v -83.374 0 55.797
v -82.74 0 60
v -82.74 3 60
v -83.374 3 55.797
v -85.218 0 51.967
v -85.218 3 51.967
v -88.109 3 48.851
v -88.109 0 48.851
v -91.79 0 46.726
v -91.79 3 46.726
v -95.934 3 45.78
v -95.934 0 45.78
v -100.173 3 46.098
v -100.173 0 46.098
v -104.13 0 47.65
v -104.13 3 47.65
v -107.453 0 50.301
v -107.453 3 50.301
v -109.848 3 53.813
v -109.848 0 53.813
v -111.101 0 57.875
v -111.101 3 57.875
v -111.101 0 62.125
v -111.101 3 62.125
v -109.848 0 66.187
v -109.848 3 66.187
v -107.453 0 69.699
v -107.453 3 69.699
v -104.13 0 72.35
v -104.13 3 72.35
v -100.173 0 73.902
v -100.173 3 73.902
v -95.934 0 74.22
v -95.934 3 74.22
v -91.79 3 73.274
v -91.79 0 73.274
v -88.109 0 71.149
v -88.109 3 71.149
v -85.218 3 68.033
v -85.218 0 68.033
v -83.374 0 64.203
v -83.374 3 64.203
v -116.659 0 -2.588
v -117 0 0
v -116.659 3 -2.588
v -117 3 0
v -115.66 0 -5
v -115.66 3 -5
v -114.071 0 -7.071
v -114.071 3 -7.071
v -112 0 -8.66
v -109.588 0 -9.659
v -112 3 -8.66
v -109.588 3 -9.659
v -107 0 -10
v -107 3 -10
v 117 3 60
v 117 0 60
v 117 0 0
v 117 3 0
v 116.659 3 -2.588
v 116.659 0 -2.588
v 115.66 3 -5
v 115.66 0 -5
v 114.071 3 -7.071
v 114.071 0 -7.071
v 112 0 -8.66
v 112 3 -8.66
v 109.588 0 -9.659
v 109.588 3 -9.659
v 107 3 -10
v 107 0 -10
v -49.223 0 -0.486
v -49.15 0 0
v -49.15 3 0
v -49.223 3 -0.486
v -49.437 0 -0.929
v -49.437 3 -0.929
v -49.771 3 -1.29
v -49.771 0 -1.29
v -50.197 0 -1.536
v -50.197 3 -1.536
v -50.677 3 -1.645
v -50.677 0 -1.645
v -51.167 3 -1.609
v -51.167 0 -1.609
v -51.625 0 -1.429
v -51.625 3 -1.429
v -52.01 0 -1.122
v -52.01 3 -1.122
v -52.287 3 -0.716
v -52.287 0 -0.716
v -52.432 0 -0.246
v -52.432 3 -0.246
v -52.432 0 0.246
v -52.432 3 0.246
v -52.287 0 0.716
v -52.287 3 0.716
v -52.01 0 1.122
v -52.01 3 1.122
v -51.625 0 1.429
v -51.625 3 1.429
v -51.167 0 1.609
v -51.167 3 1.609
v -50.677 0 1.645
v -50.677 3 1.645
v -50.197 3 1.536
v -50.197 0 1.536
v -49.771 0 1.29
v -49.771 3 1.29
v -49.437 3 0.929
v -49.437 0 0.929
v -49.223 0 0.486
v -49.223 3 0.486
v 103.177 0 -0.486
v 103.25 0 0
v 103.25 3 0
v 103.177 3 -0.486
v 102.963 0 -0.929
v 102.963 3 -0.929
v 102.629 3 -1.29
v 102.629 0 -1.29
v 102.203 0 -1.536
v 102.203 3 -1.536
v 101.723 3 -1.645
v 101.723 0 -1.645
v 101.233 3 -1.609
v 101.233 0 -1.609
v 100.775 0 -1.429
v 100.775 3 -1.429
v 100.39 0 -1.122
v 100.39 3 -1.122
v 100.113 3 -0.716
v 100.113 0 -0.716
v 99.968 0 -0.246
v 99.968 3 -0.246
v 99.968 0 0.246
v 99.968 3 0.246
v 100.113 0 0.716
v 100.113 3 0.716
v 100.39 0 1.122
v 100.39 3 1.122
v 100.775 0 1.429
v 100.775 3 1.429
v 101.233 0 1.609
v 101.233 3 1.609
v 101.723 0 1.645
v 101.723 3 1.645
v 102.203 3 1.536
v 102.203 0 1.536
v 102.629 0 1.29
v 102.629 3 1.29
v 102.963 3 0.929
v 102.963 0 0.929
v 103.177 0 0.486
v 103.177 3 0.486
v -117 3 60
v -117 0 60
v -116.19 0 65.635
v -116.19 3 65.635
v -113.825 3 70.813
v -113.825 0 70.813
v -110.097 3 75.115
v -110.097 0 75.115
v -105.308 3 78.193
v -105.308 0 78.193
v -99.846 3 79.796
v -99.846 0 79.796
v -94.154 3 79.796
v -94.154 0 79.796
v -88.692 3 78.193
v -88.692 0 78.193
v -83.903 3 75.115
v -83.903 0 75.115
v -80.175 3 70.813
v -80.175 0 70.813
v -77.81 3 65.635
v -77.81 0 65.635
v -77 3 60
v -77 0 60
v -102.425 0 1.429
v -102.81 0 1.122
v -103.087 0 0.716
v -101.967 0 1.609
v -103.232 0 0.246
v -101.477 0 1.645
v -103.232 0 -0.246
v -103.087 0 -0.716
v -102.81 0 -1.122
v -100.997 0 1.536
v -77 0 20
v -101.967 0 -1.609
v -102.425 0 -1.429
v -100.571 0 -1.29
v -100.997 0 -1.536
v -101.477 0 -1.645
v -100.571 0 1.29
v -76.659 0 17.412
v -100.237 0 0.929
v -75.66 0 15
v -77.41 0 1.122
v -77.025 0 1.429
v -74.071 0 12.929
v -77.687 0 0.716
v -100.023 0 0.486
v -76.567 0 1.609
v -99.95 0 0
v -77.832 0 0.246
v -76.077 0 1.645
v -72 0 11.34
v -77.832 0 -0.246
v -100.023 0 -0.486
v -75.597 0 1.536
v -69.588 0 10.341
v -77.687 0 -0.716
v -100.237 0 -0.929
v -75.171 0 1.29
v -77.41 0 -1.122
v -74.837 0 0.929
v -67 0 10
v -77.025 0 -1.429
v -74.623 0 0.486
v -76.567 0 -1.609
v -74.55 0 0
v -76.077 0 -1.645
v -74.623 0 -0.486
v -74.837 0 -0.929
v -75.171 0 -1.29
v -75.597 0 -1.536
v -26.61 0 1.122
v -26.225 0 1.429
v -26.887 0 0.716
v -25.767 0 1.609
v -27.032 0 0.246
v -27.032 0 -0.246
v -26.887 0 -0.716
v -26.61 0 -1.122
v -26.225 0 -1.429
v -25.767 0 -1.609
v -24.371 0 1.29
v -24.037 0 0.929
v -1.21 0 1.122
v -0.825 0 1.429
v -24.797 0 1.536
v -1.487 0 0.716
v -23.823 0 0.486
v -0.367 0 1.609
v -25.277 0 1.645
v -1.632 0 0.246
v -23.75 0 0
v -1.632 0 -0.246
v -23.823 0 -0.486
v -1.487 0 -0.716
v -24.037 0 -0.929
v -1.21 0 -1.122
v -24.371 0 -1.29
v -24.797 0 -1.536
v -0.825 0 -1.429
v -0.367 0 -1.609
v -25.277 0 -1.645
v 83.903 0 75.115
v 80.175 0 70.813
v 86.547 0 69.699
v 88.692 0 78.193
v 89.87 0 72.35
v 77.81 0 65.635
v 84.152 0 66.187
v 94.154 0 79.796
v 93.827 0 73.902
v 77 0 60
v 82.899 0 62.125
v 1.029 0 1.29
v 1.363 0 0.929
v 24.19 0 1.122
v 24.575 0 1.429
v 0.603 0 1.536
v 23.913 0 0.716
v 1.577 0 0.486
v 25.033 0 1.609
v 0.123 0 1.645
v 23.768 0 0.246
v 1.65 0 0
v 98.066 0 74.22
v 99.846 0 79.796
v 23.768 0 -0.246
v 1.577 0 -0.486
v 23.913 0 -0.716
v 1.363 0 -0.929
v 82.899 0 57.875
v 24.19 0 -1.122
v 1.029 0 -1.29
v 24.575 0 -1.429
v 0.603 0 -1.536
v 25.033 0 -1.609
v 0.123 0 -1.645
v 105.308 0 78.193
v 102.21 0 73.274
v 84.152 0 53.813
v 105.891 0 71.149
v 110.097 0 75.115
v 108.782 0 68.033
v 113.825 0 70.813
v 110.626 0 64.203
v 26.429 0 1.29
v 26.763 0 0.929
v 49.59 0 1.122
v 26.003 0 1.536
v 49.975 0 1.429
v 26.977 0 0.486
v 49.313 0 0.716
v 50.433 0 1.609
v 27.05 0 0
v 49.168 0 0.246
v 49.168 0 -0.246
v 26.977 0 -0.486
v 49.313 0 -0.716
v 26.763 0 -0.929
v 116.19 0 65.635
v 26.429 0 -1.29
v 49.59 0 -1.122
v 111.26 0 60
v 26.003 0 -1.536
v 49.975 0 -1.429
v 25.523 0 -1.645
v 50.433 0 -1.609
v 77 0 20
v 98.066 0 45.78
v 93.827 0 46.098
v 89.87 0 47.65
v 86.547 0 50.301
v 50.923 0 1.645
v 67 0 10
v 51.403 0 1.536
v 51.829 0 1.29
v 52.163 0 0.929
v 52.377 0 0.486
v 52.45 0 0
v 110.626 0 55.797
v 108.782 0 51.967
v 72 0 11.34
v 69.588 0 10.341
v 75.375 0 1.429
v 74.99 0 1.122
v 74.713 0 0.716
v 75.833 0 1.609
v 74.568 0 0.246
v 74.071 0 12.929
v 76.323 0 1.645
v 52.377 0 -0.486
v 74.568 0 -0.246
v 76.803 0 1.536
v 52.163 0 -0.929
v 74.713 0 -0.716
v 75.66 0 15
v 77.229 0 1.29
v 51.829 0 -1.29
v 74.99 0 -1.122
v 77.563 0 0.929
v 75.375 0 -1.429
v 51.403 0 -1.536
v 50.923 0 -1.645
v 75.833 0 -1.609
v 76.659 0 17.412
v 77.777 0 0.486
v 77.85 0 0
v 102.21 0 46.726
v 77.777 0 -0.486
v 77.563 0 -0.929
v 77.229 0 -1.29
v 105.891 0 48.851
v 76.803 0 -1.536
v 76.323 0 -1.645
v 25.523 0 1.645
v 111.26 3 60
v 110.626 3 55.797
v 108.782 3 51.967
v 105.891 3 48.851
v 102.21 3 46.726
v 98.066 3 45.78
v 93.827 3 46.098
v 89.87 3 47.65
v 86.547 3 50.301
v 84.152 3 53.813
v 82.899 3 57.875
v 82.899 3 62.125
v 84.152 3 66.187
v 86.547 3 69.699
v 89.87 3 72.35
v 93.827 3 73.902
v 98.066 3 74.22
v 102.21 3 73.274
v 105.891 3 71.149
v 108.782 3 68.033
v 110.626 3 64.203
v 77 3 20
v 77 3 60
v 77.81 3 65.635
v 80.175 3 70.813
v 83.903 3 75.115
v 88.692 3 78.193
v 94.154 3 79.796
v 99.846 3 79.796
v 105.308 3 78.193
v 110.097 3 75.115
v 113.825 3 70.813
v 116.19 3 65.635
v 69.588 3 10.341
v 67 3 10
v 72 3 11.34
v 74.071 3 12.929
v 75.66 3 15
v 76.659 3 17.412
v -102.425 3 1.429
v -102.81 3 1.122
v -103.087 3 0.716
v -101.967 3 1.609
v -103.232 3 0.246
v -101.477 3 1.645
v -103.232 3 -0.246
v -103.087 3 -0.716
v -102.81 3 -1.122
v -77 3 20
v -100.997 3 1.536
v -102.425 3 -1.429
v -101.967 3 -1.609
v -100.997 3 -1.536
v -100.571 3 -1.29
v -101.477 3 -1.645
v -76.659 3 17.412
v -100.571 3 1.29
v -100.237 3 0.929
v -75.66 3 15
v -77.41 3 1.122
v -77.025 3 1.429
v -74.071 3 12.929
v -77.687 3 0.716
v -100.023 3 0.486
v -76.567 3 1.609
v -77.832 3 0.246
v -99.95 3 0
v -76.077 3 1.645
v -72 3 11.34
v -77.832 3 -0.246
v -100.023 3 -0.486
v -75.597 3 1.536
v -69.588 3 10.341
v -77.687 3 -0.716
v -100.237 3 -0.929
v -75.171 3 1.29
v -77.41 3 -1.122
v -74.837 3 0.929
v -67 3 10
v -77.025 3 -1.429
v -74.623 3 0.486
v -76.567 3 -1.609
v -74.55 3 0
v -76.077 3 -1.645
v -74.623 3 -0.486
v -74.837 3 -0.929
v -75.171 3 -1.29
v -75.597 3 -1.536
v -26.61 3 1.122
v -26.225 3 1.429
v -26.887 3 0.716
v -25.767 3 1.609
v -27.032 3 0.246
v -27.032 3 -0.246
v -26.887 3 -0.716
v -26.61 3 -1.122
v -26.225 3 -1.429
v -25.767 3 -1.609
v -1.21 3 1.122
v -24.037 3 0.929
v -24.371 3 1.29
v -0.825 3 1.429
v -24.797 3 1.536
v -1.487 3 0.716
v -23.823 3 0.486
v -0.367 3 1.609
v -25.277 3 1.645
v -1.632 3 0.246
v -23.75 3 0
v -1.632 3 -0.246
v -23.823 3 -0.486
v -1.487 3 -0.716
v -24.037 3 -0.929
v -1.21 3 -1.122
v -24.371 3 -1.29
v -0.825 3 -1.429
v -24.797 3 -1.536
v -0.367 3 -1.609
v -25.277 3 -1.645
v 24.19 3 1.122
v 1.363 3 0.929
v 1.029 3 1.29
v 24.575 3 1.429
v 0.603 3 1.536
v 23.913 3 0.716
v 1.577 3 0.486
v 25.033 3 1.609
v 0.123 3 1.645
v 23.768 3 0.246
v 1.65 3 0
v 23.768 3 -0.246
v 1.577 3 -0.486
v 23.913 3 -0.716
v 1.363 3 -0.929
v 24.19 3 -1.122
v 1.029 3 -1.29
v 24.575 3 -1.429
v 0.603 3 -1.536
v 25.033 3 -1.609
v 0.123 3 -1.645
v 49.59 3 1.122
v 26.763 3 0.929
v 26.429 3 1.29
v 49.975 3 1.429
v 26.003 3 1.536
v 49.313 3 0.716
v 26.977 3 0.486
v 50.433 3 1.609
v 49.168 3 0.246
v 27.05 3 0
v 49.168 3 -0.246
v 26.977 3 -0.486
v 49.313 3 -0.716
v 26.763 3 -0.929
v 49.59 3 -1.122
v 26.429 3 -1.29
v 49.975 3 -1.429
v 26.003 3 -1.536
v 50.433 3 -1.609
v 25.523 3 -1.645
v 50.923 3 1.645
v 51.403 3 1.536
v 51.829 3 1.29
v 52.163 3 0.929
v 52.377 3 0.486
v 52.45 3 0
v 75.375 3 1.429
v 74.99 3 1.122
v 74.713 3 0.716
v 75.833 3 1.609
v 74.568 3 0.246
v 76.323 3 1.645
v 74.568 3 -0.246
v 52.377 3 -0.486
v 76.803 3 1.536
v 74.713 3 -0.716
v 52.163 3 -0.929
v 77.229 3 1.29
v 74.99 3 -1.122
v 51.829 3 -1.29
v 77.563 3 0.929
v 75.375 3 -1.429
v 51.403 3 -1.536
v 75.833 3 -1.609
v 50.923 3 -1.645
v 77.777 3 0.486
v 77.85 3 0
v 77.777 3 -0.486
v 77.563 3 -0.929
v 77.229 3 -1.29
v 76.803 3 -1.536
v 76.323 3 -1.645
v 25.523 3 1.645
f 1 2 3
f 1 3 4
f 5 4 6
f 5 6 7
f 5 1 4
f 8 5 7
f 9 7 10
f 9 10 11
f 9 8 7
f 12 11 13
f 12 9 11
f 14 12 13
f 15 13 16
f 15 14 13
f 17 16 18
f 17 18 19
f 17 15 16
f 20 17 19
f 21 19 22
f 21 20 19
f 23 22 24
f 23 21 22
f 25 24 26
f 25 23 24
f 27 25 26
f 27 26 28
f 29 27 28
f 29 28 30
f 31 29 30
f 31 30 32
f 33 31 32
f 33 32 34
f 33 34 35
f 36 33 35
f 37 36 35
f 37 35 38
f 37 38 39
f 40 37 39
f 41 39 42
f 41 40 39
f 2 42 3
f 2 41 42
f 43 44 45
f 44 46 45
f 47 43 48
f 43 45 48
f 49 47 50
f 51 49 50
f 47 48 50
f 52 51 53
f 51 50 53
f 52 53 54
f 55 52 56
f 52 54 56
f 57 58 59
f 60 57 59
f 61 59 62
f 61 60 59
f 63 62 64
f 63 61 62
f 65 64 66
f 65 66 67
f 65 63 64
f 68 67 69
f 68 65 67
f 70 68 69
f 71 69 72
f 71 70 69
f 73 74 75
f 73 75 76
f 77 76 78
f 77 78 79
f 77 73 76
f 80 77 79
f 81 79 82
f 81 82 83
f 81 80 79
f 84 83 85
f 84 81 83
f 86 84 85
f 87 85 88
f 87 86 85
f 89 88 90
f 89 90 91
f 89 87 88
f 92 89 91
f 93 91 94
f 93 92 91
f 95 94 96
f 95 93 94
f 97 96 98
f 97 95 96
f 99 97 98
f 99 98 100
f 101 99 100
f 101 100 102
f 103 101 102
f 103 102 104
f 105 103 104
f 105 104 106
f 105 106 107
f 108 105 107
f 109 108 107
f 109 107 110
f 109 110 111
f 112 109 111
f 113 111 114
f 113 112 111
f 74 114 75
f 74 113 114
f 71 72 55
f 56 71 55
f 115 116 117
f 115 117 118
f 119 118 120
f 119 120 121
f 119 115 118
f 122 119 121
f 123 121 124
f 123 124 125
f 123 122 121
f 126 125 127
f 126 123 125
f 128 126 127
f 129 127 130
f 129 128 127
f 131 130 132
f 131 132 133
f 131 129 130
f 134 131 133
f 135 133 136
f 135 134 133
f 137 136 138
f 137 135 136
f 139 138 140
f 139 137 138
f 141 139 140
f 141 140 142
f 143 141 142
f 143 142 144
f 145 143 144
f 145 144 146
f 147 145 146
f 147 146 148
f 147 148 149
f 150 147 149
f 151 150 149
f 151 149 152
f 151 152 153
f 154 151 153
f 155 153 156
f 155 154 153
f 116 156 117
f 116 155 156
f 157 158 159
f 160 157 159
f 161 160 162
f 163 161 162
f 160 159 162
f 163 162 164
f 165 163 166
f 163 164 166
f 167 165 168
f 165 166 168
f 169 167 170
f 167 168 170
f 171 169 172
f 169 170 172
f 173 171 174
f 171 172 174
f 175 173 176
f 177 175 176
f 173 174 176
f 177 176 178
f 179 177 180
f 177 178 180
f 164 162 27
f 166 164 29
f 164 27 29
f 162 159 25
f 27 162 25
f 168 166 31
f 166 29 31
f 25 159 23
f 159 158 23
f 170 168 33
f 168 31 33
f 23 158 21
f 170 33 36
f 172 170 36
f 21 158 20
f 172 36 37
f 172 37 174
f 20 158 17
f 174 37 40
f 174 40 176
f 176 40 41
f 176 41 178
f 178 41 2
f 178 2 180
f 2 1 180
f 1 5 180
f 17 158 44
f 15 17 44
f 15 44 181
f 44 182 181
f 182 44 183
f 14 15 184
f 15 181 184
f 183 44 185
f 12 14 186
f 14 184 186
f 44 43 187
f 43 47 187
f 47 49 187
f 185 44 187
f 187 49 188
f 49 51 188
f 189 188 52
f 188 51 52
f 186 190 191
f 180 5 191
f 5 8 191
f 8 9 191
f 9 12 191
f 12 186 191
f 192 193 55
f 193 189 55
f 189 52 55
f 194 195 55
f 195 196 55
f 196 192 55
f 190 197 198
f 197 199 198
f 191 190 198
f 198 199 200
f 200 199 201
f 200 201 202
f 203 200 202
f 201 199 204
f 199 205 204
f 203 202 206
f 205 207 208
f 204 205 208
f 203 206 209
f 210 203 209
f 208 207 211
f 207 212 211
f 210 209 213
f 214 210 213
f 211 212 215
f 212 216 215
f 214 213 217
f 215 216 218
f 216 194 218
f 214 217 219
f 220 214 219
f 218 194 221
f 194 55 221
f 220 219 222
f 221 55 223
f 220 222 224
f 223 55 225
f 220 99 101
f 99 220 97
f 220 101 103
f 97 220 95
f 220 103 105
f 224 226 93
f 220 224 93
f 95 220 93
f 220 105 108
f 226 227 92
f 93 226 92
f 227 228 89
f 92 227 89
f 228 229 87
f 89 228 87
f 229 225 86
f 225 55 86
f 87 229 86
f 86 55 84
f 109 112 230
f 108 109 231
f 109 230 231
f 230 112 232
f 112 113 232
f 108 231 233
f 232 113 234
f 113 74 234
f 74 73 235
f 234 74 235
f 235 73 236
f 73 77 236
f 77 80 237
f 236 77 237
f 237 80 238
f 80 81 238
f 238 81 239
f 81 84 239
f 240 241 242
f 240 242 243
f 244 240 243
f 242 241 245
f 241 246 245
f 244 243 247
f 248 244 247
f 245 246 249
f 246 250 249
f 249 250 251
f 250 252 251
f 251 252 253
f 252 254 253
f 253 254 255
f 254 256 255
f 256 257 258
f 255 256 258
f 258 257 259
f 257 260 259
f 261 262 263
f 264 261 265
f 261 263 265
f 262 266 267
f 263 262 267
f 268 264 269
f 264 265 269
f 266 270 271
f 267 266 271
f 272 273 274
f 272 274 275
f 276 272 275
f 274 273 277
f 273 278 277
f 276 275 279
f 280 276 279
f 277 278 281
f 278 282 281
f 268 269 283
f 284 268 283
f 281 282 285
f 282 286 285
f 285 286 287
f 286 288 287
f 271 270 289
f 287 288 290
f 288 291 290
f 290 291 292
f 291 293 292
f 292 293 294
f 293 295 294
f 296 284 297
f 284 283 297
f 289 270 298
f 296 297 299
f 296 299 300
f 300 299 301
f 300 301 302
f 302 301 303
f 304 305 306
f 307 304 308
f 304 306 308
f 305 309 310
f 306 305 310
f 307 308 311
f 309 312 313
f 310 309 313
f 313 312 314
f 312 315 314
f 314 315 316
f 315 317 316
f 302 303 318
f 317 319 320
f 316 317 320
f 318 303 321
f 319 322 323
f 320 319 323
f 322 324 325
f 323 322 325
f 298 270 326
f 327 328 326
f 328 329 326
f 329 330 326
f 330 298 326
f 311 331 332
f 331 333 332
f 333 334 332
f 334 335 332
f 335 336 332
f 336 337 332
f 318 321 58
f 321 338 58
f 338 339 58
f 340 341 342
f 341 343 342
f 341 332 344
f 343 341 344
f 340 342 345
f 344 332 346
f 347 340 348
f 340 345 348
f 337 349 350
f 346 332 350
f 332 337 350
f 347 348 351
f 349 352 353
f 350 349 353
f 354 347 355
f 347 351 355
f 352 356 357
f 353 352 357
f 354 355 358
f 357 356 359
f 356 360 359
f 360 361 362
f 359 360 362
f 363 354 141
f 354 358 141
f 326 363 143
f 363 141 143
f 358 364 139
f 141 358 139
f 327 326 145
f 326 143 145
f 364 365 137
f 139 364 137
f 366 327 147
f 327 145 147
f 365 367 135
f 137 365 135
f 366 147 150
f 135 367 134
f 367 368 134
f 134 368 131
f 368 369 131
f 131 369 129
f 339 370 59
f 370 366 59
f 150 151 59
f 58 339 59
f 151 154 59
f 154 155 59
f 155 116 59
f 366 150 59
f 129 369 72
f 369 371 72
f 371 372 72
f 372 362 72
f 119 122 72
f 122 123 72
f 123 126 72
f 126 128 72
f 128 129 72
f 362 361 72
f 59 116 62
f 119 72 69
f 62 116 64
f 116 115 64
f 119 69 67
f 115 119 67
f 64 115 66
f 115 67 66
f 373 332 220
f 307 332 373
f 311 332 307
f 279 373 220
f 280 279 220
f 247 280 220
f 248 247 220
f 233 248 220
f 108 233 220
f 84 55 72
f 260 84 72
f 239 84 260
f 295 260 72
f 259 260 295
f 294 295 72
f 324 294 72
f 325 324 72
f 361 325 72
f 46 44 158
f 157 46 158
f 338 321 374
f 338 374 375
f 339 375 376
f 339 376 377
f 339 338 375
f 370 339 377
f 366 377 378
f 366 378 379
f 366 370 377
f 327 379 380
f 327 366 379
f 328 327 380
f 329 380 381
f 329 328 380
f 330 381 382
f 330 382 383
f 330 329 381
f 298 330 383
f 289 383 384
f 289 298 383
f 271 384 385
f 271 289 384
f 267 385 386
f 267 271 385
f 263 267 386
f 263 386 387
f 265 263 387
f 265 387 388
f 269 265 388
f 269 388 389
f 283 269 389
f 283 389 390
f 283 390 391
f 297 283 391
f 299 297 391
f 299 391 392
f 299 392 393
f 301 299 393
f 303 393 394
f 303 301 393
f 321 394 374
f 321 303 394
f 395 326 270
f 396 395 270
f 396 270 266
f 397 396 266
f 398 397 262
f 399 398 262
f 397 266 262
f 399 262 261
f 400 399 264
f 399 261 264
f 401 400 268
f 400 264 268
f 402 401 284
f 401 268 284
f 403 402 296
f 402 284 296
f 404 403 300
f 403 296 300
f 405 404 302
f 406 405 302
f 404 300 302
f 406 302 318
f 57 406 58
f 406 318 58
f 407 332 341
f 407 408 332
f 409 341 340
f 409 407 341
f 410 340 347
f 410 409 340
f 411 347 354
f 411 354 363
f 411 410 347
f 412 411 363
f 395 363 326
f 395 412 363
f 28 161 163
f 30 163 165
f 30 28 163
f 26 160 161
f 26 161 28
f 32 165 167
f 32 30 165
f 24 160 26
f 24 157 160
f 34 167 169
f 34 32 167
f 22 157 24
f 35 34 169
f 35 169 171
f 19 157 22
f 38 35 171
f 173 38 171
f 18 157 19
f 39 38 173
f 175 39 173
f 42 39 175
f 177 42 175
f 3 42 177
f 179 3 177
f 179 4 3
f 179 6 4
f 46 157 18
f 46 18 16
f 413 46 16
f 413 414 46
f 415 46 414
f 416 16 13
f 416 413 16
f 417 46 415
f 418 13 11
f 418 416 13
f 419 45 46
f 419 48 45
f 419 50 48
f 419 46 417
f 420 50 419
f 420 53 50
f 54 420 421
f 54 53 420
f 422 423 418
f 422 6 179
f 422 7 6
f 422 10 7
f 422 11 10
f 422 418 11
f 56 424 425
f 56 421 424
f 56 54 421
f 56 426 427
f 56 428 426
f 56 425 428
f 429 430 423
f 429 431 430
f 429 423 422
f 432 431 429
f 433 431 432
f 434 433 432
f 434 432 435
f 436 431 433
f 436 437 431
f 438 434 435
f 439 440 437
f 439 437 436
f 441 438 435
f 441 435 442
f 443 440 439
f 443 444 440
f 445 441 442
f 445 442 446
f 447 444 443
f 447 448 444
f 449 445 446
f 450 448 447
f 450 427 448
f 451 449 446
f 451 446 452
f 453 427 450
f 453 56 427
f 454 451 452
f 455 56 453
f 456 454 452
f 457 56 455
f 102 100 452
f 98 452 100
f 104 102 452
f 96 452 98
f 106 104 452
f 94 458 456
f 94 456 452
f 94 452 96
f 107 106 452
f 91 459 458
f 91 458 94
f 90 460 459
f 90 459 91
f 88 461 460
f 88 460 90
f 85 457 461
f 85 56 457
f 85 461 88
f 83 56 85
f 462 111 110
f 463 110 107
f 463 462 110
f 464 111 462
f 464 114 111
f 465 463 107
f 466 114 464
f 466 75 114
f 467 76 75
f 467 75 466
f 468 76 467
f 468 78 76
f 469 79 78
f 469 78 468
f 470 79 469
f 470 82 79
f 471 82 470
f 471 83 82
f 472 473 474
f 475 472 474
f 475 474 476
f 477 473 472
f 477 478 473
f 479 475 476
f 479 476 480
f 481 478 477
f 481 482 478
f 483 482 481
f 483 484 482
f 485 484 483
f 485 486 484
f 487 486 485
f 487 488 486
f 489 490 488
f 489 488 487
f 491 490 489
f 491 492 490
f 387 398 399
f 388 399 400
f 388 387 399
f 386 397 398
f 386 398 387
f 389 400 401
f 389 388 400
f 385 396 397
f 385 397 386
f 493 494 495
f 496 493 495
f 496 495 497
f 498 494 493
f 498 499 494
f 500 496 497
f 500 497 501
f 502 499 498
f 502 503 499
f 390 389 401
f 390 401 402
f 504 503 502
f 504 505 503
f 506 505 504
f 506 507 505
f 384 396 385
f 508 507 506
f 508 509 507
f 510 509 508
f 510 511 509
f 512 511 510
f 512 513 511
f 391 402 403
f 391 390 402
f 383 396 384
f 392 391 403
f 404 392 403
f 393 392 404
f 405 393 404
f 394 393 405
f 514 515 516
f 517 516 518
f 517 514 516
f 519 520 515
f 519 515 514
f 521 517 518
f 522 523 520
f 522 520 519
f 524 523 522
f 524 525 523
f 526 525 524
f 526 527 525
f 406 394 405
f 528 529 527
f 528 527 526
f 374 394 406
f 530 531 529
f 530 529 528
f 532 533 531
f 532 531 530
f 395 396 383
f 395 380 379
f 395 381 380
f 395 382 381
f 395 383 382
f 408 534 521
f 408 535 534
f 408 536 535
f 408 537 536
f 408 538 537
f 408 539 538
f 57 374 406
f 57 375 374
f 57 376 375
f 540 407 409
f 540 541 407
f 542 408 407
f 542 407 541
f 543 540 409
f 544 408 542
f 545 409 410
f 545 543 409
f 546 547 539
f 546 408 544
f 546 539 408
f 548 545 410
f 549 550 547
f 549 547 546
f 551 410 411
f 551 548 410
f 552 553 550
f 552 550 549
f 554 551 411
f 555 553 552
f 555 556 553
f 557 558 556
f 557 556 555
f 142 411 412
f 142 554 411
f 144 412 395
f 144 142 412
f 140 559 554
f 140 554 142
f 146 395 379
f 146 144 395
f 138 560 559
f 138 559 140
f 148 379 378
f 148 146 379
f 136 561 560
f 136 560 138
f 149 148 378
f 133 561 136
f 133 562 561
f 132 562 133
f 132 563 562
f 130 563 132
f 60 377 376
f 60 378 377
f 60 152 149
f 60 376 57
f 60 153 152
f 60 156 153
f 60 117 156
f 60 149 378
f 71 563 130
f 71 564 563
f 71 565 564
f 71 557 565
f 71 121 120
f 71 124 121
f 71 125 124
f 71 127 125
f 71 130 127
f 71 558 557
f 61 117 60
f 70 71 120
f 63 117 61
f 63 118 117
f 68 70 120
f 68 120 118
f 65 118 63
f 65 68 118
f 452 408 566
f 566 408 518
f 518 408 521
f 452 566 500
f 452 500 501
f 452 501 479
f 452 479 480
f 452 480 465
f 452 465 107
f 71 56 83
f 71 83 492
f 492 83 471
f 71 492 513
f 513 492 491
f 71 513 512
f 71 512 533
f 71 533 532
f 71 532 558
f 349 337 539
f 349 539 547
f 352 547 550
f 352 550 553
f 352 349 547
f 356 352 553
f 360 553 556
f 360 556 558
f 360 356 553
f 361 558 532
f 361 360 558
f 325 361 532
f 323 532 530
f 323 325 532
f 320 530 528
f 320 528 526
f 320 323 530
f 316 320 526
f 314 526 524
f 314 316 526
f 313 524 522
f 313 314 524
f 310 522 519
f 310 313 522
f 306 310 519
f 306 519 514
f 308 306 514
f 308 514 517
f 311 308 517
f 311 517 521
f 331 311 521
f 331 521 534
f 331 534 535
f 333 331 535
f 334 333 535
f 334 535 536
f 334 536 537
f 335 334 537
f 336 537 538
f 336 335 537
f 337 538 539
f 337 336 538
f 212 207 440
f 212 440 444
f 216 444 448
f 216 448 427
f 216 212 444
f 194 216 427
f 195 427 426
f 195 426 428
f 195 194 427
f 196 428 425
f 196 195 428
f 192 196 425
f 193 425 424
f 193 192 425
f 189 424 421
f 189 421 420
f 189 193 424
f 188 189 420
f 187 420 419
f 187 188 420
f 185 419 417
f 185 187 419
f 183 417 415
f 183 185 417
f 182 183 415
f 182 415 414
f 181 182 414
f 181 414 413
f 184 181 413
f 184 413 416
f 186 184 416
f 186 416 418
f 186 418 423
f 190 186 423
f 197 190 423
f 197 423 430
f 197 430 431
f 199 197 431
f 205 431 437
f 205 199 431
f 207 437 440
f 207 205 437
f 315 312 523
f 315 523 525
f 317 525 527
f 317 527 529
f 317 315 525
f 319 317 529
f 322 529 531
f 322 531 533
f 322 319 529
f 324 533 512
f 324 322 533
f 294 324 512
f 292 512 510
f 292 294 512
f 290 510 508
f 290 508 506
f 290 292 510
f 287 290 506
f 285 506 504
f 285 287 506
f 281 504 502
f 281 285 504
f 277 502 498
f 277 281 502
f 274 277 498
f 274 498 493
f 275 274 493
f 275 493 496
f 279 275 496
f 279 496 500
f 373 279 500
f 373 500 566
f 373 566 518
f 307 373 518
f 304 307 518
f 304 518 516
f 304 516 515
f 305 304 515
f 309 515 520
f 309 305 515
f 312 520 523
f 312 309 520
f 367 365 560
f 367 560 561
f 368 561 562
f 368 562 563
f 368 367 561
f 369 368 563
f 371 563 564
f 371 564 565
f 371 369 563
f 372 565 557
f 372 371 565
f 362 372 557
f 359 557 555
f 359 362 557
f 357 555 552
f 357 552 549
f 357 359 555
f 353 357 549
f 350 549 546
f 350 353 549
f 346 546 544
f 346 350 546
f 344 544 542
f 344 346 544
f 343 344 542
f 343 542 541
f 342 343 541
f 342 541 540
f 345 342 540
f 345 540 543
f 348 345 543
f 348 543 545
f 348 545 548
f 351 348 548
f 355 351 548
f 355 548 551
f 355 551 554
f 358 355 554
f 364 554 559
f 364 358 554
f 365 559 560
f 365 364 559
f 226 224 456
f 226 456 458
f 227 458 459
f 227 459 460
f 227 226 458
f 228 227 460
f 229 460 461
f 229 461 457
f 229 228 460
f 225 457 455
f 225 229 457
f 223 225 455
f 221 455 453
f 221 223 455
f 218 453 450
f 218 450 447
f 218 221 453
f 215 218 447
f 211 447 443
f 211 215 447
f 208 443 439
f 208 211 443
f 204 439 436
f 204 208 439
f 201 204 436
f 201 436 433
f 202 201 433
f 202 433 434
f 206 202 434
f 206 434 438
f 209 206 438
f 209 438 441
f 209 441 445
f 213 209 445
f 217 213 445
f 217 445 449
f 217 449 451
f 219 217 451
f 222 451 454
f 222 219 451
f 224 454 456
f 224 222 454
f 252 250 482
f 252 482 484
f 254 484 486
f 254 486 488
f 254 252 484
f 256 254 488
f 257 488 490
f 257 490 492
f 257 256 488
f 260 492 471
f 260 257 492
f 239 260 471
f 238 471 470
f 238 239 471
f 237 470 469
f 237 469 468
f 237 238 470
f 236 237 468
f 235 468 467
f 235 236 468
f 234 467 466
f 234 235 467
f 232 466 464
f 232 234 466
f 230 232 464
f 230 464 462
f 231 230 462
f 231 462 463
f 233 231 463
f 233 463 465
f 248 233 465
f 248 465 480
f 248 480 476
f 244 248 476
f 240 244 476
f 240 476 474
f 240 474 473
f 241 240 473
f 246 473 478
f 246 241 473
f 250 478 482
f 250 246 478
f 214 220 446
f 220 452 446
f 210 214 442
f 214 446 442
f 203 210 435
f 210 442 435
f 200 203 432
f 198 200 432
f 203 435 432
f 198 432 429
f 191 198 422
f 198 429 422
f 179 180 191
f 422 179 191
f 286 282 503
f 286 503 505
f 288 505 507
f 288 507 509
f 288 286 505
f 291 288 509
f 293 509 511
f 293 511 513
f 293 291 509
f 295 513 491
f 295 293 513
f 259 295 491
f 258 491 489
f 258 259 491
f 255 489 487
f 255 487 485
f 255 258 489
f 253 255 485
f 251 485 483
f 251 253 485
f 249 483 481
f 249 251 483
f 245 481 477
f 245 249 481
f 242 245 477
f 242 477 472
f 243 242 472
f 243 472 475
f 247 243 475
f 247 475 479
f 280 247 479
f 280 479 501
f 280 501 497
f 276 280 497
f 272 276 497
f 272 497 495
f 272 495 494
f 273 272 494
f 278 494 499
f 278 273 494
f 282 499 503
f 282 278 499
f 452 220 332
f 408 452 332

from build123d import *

# Parameters (mm, degrees)
SKETCH1_R           = 1.65
SKETCH1_R_2         = 14.26
BOSS_EXTRUDE1_DEPTH = 3
FILLET1_R           = 10


with BuildPart() as part:
    # Sketch1 → Boss-Extrude1 (new body)
    with BuildSketch(Plane(origin=(0, 0, 0), x_dir=(1, 0, 0), z_dir=(0, 1, 0))):
        with BuildLine():
            Line((-77, -10), (77, -10))
            Line((77, -10), (77, -60))
            ThreePointArc((77, -60), (97, -80), (117, -60))
            Line((117, -60), (117, 10))
            Line((117, 10), (-117, 10))
            Line((-117, 10), (-117, -60))
            ThreePointArc((-117, -60), (-97, -80), (-77, -60))
            Line((-77, -60), (-77, -10))
        make_face()
        with Locations((76.2, 0)):
            Circle(SKETCH1_R, mode=Mode.SUBTRACT)
        with Locations((-76.2, 0)):
            Circle(SKETCH1_R, mode=Mode.SUBTRACT)
        with Locations((-50.8, 0)):
            Circle(SKETCH1_R, mode=Mode.SUBTRACT)
        with Locations((-25.4, 0)):
            Circle(SKETCH1_R, mode=Mode.SUBTRACT)
        Circle(SKETCH1_R, mode=Mode.SUBTRACT)
        with Locations((25.4, 0)):
            Circle(SKETCH1_R, mode=Mode.SUBTRACT)
        with Locations((50.8, 0)):
            Circle(SKETCH1_R, mode=Mode.SUBTRACT)
        with Locations((-101.6, 0)):
            Circle(SKETCH1_R, mode=Mode.SUBTRACT)
        with Locations((101.6, 0)):
            Circle(SKETCH1_R, mode=Mode.SUBTRACT)
        with Locations((-97, -60)):
            Circle(SKETCH1_R_2, mode=Mode.SUBTRACT)
        with Locations((97, -60)):
            Circle(SKETCH1_R_2, mode=Mode.SUBTRACT)
    extrude(amount=BOSS_EXTRUDE1_DEPTH)

    # Fillet1
    fillet1_edges = [part.edges().sort_by_distance(p)[0] for p in [
        (-77, 1.5, 10),
        (-117, 1.5, -10),
        (117, 1.5, -10),
        (77, 1.5, 10),
    ]]
    fillet(fillet1_edges, radius=FILLET1_R)


solid = part.part
